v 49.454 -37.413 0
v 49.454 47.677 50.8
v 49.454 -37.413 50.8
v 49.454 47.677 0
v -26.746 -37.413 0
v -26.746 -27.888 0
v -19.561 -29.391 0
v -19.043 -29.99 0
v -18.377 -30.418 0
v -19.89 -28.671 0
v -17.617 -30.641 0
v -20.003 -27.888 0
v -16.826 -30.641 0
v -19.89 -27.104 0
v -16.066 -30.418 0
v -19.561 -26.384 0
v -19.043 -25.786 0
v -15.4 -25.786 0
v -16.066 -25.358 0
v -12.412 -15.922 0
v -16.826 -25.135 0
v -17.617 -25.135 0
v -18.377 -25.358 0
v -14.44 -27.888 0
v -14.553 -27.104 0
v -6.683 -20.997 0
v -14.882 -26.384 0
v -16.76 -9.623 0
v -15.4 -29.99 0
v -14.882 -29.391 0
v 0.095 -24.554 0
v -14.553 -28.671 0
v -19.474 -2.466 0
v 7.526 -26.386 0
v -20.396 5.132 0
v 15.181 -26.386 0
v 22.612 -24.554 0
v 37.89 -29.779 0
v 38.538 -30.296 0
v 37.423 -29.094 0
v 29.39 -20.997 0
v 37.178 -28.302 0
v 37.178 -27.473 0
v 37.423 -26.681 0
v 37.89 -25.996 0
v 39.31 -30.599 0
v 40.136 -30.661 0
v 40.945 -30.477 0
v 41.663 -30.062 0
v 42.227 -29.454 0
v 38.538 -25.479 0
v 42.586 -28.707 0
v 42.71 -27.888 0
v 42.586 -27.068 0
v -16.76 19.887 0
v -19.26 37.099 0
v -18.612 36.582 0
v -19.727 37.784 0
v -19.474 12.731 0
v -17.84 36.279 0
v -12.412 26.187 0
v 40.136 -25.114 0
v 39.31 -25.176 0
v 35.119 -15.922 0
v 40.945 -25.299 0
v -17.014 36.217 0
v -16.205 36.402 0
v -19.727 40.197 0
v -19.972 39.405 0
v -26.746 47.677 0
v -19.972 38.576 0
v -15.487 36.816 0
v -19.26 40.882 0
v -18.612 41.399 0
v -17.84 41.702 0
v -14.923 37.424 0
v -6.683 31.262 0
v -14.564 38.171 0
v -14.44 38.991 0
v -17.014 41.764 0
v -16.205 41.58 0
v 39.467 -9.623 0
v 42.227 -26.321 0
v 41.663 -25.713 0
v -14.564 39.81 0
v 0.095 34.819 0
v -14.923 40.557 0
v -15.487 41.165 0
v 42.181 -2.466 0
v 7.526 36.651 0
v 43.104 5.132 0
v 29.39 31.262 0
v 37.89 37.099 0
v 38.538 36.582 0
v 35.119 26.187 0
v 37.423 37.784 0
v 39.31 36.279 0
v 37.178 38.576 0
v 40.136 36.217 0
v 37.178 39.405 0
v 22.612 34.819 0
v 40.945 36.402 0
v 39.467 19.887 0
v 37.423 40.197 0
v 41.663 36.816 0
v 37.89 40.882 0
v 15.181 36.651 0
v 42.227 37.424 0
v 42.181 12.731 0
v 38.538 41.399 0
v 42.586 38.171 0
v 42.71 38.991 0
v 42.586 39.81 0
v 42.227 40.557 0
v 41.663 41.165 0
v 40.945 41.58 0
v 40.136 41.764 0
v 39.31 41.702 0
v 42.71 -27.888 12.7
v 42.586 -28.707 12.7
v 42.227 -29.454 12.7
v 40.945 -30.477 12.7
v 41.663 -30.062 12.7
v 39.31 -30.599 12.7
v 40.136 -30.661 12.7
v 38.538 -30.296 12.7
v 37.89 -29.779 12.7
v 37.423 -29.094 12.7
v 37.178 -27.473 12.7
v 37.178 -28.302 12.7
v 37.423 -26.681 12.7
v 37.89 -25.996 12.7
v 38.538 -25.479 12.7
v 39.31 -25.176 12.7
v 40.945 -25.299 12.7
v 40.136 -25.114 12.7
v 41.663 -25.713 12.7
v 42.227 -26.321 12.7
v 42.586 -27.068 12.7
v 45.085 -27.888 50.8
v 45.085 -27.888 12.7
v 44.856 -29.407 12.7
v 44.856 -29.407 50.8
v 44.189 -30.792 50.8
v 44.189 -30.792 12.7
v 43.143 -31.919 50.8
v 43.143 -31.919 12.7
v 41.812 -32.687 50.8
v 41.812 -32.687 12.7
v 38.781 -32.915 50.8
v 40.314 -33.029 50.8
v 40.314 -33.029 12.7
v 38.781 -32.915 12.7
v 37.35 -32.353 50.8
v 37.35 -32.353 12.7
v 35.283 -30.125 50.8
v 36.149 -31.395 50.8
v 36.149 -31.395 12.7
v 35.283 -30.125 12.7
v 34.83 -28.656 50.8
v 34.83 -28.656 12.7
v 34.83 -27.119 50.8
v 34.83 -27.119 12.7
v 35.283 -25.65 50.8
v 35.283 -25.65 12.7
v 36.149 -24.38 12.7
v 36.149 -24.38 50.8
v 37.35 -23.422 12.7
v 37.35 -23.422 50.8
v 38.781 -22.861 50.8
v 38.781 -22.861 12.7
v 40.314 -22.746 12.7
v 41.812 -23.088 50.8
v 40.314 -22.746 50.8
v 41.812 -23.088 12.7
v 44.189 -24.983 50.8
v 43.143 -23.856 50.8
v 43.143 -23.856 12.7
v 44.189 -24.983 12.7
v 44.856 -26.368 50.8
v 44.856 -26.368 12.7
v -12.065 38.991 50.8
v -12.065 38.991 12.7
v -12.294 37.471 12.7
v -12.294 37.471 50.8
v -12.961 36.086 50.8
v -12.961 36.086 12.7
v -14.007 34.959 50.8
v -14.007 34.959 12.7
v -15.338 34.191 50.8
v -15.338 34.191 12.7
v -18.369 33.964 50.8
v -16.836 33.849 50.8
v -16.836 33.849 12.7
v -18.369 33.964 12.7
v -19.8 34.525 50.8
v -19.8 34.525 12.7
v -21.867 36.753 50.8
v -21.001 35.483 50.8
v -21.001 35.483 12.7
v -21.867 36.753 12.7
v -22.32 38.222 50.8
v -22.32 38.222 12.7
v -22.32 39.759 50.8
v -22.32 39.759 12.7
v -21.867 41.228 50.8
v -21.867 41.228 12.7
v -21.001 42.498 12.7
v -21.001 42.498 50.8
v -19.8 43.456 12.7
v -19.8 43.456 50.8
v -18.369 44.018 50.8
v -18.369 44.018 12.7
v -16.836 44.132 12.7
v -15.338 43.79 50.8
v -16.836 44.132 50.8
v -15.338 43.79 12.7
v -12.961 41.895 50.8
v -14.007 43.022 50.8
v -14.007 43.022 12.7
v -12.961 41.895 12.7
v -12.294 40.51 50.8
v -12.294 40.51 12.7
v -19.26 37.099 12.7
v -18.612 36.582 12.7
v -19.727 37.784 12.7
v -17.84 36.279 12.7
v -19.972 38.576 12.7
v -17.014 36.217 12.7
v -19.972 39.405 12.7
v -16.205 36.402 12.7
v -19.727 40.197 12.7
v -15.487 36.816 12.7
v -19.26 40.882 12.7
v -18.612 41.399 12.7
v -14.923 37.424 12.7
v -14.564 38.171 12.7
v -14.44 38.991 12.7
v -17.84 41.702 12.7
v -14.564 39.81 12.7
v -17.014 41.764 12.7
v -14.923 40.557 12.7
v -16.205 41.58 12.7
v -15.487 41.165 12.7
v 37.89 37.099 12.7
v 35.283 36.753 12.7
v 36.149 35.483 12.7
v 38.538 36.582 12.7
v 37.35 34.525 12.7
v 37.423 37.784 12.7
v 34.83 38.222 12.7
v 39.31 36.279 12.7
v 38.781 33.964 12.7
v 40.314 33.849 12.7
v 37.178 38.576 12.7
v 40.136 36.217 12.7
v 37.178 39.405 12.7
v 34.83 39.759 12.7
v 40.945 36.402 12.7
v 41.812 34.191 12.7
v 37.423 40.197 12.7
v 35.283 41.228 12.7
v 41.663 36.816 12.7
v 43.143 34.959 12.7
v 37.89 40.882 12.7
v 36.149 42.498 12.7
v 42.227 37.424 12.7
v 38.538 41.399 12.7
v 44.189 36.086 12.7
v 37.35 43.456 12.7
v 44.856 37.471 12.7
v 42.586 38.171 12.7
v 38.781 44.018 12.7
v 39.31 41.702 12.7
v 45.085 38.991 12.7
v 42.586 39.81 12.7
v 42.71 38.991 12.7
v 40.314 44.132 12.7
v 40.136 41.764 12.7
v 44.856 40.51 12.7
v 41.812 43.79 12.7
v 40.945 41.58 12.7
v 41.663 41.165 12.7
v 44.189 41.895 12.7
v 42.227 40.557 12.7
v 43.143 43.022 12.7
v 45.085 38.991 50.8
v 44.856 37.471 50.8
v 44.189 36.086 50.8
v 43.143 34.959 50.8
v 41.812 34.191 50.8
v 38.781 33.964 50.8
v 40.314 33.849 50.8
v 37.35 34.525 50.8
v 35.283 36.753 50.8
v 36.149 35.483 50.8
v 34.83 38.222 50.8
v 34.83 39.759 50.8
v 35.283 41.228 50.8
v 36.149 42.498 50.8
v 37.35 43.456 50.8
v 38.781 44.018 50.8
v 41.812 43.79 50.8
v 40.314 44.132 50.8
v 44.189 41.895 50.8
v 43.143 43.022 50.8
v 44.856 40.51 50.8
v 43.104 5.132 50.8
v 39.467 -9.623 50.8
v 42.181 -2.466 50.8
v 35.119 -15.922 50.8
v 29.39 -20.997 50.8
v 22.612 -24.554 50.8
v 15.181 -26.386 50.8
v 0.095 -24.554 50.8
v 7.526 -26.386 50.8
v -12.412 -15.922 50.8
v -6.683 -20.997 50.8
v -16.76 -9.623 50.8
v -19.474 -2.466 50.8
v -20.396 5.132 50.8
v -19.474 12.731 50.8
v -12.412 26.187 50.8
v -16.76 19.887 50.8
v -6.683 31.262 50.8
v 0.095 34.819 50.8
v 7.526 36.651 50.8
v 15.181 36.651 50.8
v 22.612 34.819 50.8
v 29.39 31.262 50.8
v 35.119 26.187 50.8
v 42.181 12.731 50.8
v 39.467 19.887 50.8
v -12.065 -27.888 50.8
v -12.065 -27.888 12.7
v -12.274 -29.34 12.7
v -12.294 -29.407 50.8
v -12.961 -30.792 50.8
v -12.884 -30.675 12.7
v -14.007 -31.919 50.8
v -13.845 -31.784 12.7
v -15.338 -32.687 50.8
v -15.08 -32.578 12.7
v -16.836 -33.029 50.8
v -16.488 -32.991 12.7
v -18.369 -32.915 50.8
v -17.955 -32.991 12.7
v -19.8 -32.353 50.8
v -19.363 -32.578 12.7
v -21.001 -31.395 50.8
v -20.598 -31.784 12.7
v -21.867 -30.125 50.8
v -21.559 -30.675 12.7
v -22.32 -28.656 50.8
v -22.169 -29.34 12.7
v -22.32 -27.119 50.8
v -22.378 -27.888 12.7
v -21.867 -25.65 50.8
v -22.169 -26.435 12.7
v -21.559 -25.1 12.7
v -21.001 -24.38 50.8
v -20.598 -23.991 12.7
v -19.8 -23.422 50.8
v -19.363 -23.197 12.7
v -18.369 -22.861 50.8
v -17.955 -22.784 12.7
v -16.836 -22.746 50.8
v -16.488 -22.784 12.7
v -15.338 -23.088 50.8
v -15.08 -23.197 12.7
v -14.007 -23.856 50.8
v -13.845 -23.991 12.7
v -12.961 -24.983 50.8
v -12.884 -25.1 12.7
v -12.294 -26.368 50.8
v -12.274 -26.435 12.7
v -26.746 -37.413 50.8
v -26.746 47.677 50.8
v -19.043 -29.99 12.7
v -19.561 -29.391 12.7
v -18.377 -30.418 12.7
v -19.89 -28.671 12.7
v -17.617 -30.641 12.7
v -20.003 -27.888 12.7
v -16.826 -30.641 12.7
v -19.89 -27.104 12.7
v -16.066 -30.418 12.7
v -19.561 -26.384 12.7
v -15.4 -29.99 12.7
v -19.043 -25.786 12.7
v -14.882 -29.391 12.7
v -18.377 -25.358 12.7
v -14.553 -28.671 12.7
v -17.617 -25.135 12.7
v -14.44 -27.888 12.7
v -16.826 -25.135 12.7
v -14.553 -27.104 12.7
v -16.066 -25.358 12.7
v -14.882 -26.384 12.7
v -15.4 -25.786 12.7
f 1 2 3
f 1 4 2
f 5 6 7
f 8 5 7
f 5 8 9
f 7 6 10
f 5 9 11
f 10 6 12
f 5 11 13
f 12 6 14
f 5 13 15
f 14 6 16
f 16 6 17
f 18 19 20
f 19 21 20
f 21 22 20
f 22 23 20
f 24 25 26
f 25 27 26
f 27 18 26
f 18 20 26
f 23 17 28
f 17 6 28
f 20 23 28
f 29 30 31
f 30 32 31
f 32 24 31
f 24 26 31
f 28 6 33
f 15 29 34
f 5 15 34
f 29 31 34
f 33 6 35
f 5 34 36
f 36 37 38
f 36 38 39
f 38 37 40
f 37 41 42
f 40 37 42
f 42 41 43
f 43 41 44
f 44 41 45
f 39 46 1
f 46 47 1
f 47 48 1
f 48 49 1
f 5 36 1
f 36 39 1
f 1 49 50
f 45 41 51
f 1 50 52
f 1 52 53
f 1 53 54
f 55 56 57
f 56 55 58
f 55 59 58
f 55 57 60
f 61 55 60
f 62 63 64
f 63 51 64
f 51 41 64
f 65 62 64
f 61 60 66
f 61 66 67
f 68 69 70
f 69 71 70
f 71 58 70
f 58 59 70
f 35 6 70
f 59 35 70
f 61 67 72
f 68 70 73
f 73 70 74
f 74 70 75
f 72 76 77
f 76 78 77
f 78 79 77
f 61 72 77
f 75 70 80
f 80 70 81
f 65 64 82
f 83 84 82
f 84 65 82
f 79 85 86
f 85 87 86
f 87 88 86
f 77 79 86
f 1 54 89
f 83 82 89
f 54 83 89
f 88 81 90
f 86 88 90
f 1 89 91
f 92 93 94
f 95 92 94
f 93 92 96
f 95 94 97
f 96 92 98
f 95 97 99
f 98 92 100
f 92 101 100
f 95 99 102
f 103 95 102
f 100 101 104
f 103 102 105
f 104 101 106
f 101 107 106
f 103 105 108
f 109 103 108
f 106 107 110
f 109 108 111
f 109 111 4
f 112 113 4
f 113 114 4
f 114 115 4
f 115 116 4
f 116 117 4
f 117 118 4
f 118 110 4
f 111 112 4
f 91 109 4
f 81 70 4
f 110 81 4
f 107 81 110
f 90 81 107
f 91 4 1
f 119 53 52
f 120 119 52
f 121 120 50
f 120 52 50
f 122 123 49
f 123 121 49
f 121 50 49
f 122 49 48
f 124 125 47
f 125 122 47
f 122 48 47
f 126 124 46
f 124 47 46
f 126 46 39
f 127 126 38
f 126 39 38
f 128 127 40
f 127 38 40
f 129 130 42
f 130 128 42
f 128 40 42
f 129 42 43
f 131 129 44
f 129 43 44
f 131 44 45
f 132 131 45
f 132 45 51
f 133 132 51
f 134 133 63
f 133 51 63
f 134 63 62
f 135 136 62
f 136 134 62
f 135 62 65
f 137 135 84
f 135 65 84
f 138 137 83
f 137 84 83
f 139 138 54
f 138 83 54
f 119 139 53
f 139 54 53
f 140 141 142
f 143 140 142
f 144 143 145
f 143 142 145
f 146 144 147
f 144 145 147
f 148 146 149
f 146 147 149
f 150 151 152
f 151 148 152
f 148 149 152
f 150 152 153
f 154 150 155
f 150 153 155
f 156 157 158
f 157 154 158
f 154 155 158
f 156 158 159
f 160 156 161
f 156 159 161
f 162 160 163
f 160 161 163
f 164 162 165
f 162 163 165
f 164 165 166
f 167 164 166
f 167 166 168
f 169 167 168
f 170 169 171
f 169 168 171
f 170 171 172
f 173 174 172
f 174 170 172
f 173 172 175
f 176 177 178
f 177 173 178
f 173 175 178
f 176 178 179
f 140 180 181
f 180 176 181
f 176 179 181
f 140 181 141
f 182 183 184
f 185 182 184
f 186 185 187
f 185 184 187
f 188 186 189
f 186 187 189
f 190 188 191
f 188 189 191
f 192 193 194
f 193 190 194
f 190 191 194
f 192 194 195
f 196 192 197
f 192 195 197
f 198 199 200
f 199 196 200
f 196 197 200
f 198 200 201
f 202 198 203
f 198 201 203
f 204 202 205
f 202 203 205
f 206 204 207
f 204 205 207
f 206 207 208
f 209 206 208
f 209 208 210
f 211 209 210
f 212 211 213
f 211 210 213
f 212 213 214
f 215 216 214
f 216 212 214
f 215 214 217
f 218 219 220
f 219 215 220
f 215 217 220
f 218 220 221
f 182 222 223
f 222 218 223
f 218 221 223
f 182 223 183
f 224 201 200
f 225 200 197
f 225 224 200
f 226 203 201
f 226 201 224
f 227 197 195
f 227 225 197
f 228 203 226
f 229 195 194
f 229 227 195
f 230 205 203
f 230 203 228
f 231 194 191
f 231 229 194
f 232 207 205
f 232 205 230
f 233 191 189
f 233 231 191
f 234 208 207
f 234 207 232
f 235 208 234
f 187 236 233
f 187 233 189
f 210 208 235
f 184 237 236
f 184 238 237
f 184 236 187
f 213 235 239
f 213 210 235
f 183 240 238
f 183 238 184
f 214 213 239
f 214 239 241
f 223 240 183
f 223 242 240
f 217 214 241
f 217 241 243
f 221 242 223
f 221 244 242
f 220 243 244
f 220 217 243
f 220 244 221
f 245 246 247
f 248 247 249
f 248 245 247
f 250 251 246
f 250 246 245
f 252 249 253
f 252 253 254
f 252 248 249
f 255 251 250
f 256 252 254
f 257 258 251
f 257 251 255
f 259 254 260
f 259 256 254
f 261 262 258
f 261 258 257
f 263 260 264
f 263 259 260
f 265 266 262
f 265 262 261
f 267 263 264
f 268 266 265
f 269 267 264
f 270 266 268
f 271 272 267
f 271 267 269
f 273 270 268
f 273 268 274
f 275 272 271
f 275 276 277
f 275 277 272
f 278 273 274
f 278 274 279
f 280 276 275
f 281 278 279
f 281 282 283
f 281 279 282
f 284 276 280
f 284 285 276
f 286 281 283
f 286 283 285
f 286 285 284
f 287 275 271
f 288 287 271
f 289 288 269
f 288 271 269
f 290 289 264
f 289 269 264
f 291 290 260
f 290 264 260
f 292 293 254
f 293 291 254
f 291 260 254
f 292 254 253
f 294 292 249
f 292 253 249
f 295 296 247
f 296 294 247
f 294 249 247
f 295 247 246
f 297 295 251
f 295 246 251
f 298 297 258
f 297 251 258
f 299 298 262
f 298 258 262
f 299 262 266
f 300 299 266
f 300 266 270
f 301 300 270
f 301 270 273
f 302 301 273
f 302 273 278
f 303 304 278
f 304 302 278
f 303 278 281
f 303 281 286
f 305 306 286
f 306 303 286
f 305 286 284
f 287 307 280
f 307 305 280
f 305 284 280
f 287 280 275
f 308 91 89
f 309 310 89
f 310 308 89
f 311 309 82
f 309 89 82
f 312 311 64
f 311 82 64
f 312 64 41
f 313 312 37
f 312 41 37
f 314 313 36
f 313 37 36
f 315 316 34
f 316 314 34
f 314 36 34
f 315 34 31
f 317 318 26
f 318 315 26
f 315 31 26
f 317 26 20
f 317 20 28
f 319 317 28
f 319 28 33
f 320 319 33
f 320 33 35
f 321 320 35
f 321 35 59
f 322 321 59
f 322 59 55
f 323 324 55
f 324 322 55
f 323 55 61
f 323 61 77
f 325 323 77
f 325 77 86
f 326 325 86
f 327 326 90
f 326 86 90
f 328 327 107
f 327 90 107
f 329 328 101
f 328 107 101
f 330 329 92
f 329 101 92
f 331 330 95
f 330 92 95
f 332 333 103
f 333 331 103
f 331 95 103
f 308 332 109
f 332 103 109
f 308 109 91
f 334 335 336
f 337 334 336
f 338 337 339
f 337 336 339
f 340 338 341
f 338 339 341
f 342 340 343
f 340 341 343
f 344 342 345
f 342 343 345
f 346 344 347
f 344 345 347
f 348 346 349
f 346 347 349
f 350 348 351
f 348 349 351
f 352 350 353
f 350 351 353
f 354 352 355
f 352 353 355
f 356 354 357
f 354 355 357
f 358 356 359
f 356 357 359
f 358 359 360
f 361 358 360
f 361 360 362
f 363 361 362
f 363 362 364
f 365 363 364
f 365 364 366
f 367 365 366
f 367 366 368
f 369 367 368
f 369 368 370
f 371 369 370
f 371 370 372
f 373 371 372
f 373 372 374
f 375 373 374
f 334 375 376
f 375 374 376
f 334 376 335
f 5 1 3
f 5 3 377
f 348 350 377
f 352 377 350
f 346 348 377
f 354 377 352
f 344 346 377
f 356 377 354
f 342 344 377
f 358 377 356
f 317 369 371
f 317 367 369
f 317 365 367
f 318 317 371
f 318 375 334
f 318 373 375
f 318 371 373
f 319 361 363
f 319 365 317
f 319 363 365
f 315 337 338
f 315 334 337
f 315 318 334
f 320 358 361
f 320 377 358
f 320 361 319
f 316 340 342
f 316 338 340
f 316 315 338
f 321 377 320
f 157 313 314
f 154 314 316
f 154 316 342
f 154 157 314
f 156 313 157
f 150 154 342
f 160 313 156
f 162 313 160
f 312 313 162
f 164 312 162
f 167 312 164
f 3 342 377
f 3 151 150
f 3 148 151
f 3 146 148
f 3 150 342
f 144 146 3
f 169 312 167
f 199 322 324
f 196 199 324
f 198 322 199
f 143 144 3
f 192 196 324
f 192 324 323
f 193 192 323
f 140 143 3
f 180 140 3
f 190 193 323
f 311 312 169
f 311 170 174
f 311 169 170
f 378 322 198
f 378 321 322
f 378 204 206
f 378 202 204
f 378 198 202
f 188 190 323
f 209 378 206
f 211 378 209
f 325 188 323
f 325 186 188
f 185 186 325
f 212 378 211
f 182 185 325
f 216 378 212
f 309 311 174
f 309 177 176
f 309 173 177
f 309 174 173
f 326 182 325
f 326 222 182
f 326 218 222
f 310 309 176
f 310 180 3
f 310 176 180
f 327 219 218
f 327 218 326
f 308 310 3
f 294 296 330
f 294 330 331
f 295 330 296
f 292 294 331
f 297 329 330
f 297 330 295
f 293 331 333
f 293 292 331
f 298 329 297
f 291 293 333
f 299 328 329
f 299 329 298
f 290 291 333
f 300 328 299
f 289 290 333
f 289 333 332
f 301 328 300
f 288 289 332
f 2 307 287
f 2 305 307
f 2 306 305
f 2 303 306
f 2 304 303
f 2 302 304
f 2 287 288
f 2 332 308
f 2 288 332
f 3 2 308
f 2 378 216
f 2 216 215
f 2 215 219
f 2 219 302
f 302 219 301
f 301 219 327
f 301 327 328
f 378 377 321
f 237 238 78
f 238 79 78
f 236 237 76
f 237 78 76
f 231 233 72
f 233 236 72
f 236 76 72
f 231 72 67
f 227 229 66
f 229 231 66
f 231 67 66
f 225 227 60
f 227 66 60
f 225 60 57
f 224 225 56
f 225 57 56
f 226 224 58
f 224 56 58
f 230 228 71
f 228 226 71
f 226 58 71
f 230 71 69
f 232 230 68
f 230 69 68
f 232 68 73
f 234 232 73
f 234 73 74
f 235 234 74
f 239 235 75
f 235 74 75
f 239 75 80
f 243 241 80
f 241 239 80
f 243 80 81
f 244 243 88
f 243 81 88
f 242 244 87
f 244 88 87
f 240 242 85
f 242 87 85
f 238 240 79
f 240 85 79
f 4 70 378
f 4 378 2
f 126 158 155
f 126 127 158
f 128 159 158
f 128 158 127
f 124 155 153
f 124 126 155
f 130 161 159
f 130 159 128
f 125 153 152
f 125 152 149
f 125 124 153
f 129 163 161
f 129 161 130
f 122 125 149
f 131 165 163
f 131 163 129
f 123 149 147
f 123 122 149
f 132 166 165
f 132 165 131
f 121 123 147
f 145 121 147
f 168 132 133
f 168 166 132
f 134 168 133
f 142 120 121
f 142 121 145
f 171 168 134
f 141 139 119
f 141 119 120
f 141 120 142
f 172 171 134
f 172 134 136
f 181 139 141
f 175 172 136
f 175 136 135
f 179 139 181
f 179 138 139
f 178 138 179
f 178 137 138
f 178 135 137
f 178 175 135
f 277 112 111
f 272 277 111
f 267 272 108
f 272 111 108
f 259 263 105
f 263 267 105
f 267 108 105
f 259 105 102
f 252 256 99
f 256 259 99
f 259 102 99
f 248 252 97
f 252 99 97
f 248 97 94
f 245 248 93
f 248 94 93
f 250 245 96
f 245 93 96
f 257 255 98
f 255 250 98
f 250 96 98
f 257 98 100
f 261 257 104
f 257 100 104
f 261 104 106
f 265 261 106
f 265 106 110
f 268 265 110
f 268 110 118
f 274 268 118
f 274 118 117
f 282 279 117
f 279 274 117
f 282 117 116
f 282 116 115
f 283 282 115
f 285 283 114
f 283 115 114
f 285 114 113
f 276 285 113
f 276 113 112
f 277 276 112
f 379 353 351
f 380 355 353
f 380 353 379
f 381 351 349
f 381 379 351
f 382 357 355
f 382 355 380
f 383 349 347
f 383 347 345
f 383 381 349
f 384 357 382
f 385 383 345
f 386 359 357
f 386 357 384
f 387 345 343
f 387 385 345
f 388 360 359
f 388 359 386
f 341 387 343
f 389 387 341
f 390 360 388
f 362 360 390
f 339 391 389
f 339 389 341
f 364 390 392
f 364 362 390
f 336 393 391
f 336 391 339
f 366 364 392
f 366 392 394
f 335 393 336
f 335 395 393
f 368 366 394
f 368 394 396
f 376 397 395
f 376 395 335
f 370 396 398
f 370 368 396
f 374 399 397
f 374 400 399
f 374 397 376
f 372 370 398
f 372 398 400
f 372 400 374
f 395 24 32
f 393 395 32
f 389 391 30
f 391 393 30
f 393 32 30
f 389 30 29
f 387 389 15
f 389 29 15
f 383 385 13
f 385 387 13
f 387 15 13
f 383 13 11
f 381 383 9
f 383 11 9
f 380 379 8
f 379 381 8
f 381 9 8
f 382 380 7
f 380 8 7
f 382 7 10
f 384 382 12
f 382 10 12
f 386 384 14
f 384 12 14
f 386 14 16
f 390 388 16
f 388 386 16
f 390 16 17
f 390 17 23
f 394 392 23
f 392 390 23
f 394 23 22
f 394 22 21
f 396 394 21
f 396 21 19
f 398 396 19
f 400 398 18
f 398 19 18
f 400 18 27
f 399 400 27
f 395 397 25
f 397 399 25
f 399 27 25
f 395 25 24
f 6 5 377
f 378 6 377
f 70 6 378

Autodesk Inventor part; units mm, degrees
ref_plane "YZ Plane" through (0, 0, 0) normal (1, 0, 0) x (0, 1, 0)
ref_plane "XZ Plane" through (0, 0, 0) normal (0, 1, 0) x (-1, 0, 0)
ref_plane "XY Plane" through (0, 0, 0) normal (0, 0, 1) x (1, 0, 0)
sketch "Sketch1" plane through (0, 0, 0) normal (0, 0, 1) x (1, 0, 0)
  line L0 (-26.7465, 47.6774) -> (49.4535, 47.6774)
  line L1 (49.4535, 47.6774) -> (49.4535, -37.4126)
  line L2 (49.4535, -37.4126) -> (-26.7465, -37.4126)
  line L3 (-26.7465, -37.4126) -> (-26.7465, 47.6774)
  line L4 (-26.7465, 47.6774) -> (-9.2459, 47.6774)
  line L5 (49.4535, 47.6774) -> (31.9529, 47.6774)
  line L6 (49.4535, 47.6774) -> (49.4535, 41.683)
  line L7 (49.4535, -37.4126) -> (49.4535, -31.4182)
  circle A0 centre (11.3535, 5.1324) radius 31.75
  line L8 (-26.7465, 47.6774) -> (-17.2215, 47.6774)
  line L9 (49.4535, 47.6774) -> (39.9285, 47.6774)
  line L10 (-26.7465, -37.4126) -> (-26.7465, -27.8876)
  circle A1 centre (-17.2215, -27.8876) radius 2.7813
  circle A2 centre (39.9285, -27.8876) radius 2.7813
  circle A3 centre (39.9285, 38.9906) radius 2.7813
  line L11 (-26.7465, -27.8876) -> (-17.2215, -27.8876)
  circle A4 centre (-17.2215, 38.9906) radius 2.7813
  point P0 (0, 0)
  dimension "d0" = 76.2
  dimension "d1" = 85.09
  dimension "d2" = 17.5006
  dimension "d3" = 17.5006
  dimension "d4" = 5.9944
  dimension "d5" = 5.9944
  dimension "d25" = 63.5
  dimension "d26" = 9.525
  dimension "d30" = 9.525
  dimension "d31" = 5.5626
  dimension "d32" = 5.5626
  dimension "d45" = 5.5626
  dimension "d46" = 9.525
  dimension "d48" = 5.5626
extrude "Extrusion6" add sketch "Sketch1" along normal blind 12.7
sketch "Sketch4" plane through (0, 0, 12.7) normal (0, 0, 1) x (1, 0, 0)
  circle A0 centre (11.3535, 5.1324) radius 31.75 projected
  circle A1 centre (-17.2215, 38.9906) radius 2.7813 projected
  circle A2 centre (39.9285, -27.8876) radius 2.7813 projected
  circle A3 centre (-17.2215, -27.8876) radius 2.7813 projected
  circle A4 centre (39.9285, 38.9906) radius 2.7813 projected
  line L0 (-26.7465, 47.6774) -> (49.4535, 47.6774) projected
  line L1 (-26.7465, -37.4126) -> (-26.7465, 47.6774) projected
  line L2 (-26.7465, -37.4126) -> (49.4535, -37.4126)
  line L3 (49.4535, -37.4126) -> (49.4535, 47.6774)
  line L4 (49.4535, 47.6774) -> (-26.7465, 47.6774)
  line L5 (-26.7465, 47.6774) -> (-26.7465, -37.4126)
  circle A5 centre (11.3535, 5.1324) radius 31.75
  circle A6 centre (-17.2215, -27.8876) radius 5.1562
  circle A7 centre (-17.2215, 38.9906) radius 5.1562
  circle A8 centre (39.9285, 38.9906) radius 5.1562
  circle A9 centre (39.9285, -27.8876) radius 5.1562
  point P0 (0, 0)
  dimension "d51" = 10.3124
  dimension "d52" = 10.3124
  dimension "d53" = 10.3124
  dimension "d54" = 10.3124
extrude "Extrusion7" add sketch "Sketch4" along normal blind 38.1 contours L0 L3 L2 L1
properties part number "glass socket"
